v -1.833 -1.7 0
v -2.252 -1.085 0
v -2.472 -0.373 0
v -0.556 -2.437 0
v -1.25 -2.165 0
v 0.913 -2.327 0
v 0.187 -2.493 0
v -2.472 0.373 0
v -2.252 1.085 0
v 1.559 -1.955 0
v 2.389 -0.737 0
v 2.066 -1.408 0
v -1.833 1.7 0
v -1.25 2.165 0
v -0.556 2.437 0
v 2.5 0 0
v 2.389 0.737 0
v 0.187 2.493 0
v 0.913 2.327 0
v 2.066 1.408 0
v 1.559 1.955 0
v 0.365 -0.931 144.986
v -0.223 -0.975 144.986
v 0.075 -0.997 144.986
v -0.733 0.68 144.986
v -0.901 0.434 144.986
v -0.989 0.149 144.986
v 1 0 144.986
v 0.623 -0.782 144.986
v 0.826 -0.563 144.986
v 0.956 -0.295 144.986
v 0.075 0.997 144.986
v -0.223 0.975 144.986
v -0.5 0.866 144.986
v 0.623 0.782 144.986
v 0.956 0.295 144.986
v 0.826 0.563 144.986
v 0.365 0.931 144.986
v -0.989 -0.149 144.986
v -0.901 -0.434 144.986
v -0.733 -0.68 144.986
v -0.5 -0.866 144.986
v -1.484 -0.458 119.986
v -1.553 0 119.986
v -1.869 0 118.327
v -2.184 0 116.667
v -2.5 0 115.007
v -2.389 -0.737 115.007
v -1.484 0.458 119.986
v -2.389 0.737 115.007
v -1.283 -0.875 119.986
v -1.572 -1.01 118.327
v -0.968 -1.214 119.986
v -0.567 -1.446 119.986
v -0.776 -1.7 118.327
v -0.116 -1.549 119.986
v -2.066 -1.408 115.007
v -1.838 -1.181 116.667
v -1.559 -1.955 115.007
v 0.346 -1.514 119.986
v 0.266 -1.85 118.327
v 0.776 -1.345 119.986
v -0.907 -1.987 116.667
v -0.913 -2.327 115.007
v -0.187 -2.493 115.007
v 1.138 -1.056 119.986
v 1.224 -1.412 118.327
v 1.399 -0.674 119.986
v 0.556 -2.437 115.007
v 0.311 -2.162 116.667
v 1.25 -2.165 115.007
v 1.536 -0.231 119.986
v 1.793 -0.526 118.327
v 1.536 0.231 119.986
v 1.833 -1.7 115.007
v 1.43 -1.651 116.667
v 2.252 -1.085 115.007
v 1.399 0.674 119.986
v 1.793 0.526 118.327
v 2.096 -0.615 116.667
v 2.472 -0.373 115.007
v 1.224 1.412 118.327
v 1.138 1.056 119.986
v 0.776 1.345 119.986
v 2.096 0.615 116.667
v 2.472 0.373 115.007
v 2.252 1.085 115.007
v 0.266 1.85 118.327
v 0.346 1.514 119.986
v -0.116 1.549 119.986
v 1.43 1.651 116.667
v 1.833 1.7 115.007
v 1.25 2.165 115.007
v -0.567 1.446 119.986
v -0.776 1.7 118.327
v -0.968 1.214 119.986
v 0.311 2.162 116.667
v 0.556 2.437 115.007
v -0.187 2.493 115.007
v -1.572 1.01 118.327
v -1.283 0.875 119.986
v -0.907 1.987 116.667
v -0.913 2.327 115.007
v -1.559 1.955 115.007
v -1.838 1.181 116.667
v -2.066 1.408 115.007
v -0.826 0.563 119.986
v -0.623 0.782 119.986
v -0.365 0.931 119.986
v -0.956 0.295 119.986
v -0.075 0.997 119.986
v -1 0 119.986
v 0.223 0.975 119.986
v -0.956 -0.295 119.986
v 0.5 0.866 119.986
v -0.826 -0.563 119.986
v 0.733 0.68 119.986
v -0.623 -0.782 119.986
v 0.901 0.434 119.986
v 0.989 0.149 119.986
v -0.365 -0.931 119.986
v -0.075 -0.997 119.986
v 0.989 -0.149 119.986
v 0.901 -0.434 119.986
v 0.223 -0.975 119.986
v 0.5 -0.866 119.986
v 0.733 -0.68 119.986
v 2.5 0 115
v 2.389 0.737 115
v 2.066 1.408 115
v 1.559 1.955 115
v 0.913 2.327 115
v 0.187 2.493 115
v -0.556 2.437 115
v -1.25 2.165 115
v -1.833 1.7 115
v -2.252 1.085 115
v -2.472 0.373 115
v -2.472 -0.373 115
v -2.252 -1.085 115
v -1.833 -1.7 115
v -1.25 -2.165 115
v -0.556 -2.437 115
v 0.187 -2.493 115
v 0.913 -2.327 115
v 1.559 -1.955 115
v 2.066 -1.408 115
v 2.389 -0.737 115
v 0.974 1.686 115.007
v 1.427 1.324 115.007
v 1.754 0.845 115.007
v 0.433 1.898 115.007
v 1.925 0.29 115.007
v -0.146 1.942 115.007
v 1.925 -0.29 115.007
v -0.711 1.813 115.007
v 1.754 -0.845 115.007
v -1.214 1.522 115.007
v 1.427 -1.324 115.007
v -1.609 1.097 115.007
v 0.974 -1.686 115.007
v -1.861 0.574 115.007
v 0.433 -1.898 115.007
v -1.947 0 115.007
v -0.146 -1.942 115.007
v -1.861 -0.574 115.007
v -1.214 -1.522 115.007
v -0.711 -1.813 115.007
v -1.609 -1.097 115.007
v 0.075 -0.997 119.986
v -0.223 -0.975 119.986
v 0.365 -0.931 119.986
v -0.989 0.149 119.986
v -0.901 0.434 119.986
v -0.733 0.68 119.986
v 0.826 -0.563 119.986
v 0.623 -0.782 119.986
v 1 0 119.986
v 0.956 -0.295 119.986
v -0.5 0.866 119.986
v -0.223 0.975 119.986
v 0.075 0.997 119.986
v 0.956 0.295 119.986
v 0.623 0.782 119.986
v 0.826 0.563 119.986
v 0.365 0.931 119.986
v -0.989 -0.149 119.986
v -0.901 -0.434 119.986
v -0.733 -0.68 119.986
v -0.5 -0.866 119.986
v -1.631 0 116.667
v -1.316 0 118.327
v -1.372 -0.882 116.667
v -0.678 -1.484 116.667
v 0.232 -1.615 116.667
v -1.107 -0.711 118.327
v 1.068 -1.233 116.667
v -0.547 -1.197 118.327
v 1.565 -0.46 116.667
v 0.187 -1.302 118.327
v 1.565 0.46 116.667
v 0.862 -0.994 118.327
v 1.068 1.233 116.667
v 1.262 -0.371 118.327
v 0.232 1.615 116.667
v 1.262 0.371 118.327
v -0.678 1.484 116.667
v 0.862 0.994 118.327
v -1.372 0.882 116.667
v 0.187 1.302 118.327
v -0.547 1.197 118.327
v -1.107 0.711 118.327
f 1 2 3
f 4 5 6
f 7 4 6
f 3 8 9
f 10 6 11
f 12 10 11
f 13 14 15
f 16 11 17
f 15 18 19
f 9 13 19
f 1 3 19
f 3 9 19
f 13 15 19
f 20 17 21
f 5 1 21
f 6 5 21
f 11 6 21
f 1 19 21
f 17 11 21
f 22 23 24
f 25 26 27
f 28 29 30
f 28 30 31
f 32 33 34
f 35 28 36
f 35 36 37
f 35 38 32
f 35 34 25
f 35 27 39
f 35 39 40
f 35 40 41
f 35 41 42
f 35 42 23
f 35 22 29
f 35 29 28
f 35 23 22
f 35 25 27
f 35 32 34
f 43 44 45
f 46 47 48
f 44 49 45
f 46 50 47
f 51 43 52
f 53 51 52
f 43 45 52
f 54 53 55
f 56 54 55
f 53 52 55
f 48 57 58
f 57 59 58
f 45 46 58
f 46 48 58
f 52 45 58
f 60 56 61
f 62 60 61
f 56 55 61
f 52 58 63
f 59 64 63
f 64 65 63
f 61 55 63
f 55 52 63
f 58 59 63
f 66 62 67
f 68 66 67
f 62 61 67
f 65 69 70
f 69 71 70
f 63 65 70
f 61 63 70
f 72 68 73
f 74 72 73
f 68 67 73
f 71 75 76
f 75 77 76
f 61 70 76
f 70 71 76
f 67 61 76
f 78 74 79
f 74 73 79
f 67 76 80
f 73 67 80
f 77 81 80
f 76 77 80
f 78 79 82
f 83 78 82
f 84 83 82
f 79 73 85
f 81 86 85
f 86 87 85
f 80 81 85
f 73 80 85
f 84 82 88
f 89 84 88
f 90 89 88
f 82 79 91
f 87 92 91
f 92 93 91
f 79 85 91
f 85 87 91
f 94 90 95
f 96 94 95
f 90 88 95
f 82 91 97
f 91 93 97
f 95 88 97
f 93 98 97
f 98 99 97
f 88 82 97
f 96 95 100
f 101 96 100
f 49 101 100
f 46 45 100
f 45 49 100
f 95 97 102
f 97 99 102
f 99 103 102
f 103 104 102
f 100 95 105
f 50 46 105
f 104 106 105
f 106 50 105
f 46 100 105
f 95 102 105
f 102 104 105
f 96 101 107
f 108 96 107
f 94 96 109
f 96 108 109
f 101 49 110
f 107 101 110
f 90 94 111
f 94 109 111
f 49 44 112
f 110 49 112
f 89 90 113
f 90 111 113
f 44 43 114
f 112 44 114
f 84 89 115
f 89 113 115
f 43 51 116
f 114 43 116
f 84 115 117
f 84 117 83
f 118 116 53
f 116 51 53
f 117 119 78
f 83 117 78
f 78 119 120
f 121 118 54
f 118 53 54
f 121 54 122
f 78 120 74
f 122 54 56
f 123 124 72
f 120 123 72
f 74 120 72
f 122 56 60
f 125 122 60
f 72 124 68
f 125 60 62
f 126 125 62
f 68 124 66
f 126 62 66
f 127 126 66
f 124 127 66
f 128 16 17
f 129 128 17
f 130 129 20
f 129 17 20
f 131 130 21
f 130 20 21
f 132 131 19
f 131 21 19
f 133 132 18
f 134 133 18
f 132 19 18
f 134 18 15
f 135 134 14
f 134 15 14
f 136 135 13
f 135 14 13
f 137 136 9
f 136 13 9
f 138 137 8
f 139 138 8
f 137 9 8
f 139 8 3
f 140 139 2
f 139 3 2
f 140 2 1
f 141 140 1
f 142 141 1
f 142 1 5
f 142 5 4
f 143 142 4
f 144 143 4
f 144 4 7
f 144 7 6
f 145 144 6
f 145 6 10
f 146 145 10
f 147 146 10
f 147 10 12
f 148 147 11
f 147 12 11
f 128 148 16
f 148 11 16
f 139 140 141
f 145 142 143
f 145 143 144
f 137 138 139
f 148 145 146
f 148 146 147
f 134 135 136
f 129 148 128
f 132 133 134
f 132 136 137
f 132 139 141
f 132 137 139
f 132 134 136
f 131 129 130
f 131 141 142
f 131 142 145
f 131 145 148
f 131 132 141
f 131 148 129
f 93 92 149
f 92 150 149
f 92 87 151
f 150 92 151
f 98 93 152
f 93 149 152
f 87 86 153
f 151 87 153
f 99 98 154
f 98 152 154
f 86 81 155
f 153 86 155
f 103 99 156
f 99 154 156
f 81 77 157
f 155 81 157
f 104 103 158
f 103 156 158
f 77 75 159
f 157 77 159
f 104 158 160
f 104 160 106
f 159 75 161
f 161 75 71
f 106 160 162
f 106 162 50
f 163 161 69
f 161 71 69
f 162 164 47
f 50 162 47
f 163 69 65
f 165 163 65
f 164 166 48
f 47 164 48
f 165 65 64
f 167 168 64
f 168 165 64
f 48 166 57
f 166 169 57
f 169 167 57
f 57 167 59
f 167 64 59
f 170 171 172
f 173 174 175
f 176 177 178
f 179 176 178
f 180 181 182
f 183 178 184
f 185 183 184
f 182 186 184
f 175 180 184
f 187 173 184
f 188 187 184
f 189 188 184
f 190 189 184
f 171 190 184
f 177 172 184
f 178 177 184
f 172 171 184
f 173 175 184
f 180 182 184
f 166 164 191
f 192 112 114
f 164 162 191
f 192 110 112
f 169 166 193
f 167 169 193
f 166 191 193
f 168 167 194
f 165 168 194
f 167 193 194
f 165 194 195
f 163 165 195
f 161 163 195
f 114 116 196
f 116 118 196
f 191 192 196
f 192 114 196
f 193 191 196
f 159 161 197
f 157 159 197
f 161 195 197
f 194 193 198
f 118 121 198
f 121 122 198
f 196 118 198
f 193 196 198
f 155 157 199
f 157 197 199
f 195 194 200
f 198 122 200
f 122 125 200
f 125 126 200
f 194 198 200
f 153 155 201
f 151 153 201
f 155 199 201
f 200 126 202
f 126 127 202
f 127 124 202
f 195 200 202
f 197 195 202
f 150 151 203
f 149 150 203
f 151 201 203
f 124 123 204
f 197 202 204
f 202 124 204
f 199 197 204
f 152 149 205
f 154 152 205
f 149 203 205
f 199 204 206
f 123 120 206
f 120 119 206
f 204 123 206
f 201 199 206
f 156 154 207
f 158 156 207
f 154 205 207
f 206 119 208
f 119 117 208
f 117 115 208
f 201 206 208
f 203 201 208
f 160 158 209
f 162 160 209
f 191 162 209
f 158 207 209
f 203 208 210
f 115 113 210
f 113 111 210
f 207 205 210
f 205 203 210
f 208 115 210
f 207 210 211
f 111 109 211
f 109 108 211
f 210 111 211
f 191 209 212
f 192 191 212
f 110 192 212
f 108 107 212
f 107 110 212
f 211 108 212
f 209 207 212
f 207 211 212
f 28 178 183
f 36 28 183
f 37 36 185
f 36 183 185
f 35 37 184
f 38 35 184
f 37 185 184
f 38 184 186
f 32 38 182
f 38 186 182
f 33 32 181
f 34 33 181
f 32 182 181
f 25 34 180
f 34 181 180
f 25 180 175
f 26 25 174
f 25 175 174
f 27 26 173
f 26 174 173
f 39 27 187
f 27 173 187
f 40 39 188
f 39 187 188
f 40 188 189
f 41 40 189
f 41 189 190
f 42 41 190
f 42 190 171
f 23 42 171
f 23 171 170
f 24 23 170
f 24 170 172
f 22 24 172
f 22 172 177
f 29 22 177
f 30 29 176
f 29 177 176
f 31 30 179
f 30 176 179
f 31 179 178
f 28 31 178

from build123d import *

# Parameters (mm, degrees)
SKETCH1_R           = 2.5
BOSS_EXTRUDE1_DEPTH = 115
SKETCH4_R           = 1
BOSS_EXTRUDE2_DEPTH = 25


with BuildPart() as part:
    # Sketch1 → Boss-Extrude1 (new body)
    with BuildSketch(Plane.XY):
        Circle(SKETCH1_R)
    extrude(amount=BOSS_EXTRUDE1_DEPTH)


with BuildPart() as body_2:
    # Sketch2 → Revolve1 (revolve)
    with BuildSketch(Plane(origin=(0, 0, 0), x_dir=(1, 0, 0), z_dir=(0, 1, 0))):
        Polygon((-1.947112733, -115.007064782), (-1, -119.98622168), (-1.552887267, -119.98622168), (-2.5, -115.007064782), align=None)
    revolve(axis=Axis((0, 0, 0), (0, 0, 1)))


with BuildPart() as body_3:
    # Sketch4 → Boss-Extrude2 (new body)
    with BuildSketch(Plane.XY.offset(119.98622168)):
        Circle(SKETCH4_R)
    extrude(amount=BOSS_EXTRUDE2_DEPTH)


solid = Compound([part.part, body_2.part, body_3.part])
